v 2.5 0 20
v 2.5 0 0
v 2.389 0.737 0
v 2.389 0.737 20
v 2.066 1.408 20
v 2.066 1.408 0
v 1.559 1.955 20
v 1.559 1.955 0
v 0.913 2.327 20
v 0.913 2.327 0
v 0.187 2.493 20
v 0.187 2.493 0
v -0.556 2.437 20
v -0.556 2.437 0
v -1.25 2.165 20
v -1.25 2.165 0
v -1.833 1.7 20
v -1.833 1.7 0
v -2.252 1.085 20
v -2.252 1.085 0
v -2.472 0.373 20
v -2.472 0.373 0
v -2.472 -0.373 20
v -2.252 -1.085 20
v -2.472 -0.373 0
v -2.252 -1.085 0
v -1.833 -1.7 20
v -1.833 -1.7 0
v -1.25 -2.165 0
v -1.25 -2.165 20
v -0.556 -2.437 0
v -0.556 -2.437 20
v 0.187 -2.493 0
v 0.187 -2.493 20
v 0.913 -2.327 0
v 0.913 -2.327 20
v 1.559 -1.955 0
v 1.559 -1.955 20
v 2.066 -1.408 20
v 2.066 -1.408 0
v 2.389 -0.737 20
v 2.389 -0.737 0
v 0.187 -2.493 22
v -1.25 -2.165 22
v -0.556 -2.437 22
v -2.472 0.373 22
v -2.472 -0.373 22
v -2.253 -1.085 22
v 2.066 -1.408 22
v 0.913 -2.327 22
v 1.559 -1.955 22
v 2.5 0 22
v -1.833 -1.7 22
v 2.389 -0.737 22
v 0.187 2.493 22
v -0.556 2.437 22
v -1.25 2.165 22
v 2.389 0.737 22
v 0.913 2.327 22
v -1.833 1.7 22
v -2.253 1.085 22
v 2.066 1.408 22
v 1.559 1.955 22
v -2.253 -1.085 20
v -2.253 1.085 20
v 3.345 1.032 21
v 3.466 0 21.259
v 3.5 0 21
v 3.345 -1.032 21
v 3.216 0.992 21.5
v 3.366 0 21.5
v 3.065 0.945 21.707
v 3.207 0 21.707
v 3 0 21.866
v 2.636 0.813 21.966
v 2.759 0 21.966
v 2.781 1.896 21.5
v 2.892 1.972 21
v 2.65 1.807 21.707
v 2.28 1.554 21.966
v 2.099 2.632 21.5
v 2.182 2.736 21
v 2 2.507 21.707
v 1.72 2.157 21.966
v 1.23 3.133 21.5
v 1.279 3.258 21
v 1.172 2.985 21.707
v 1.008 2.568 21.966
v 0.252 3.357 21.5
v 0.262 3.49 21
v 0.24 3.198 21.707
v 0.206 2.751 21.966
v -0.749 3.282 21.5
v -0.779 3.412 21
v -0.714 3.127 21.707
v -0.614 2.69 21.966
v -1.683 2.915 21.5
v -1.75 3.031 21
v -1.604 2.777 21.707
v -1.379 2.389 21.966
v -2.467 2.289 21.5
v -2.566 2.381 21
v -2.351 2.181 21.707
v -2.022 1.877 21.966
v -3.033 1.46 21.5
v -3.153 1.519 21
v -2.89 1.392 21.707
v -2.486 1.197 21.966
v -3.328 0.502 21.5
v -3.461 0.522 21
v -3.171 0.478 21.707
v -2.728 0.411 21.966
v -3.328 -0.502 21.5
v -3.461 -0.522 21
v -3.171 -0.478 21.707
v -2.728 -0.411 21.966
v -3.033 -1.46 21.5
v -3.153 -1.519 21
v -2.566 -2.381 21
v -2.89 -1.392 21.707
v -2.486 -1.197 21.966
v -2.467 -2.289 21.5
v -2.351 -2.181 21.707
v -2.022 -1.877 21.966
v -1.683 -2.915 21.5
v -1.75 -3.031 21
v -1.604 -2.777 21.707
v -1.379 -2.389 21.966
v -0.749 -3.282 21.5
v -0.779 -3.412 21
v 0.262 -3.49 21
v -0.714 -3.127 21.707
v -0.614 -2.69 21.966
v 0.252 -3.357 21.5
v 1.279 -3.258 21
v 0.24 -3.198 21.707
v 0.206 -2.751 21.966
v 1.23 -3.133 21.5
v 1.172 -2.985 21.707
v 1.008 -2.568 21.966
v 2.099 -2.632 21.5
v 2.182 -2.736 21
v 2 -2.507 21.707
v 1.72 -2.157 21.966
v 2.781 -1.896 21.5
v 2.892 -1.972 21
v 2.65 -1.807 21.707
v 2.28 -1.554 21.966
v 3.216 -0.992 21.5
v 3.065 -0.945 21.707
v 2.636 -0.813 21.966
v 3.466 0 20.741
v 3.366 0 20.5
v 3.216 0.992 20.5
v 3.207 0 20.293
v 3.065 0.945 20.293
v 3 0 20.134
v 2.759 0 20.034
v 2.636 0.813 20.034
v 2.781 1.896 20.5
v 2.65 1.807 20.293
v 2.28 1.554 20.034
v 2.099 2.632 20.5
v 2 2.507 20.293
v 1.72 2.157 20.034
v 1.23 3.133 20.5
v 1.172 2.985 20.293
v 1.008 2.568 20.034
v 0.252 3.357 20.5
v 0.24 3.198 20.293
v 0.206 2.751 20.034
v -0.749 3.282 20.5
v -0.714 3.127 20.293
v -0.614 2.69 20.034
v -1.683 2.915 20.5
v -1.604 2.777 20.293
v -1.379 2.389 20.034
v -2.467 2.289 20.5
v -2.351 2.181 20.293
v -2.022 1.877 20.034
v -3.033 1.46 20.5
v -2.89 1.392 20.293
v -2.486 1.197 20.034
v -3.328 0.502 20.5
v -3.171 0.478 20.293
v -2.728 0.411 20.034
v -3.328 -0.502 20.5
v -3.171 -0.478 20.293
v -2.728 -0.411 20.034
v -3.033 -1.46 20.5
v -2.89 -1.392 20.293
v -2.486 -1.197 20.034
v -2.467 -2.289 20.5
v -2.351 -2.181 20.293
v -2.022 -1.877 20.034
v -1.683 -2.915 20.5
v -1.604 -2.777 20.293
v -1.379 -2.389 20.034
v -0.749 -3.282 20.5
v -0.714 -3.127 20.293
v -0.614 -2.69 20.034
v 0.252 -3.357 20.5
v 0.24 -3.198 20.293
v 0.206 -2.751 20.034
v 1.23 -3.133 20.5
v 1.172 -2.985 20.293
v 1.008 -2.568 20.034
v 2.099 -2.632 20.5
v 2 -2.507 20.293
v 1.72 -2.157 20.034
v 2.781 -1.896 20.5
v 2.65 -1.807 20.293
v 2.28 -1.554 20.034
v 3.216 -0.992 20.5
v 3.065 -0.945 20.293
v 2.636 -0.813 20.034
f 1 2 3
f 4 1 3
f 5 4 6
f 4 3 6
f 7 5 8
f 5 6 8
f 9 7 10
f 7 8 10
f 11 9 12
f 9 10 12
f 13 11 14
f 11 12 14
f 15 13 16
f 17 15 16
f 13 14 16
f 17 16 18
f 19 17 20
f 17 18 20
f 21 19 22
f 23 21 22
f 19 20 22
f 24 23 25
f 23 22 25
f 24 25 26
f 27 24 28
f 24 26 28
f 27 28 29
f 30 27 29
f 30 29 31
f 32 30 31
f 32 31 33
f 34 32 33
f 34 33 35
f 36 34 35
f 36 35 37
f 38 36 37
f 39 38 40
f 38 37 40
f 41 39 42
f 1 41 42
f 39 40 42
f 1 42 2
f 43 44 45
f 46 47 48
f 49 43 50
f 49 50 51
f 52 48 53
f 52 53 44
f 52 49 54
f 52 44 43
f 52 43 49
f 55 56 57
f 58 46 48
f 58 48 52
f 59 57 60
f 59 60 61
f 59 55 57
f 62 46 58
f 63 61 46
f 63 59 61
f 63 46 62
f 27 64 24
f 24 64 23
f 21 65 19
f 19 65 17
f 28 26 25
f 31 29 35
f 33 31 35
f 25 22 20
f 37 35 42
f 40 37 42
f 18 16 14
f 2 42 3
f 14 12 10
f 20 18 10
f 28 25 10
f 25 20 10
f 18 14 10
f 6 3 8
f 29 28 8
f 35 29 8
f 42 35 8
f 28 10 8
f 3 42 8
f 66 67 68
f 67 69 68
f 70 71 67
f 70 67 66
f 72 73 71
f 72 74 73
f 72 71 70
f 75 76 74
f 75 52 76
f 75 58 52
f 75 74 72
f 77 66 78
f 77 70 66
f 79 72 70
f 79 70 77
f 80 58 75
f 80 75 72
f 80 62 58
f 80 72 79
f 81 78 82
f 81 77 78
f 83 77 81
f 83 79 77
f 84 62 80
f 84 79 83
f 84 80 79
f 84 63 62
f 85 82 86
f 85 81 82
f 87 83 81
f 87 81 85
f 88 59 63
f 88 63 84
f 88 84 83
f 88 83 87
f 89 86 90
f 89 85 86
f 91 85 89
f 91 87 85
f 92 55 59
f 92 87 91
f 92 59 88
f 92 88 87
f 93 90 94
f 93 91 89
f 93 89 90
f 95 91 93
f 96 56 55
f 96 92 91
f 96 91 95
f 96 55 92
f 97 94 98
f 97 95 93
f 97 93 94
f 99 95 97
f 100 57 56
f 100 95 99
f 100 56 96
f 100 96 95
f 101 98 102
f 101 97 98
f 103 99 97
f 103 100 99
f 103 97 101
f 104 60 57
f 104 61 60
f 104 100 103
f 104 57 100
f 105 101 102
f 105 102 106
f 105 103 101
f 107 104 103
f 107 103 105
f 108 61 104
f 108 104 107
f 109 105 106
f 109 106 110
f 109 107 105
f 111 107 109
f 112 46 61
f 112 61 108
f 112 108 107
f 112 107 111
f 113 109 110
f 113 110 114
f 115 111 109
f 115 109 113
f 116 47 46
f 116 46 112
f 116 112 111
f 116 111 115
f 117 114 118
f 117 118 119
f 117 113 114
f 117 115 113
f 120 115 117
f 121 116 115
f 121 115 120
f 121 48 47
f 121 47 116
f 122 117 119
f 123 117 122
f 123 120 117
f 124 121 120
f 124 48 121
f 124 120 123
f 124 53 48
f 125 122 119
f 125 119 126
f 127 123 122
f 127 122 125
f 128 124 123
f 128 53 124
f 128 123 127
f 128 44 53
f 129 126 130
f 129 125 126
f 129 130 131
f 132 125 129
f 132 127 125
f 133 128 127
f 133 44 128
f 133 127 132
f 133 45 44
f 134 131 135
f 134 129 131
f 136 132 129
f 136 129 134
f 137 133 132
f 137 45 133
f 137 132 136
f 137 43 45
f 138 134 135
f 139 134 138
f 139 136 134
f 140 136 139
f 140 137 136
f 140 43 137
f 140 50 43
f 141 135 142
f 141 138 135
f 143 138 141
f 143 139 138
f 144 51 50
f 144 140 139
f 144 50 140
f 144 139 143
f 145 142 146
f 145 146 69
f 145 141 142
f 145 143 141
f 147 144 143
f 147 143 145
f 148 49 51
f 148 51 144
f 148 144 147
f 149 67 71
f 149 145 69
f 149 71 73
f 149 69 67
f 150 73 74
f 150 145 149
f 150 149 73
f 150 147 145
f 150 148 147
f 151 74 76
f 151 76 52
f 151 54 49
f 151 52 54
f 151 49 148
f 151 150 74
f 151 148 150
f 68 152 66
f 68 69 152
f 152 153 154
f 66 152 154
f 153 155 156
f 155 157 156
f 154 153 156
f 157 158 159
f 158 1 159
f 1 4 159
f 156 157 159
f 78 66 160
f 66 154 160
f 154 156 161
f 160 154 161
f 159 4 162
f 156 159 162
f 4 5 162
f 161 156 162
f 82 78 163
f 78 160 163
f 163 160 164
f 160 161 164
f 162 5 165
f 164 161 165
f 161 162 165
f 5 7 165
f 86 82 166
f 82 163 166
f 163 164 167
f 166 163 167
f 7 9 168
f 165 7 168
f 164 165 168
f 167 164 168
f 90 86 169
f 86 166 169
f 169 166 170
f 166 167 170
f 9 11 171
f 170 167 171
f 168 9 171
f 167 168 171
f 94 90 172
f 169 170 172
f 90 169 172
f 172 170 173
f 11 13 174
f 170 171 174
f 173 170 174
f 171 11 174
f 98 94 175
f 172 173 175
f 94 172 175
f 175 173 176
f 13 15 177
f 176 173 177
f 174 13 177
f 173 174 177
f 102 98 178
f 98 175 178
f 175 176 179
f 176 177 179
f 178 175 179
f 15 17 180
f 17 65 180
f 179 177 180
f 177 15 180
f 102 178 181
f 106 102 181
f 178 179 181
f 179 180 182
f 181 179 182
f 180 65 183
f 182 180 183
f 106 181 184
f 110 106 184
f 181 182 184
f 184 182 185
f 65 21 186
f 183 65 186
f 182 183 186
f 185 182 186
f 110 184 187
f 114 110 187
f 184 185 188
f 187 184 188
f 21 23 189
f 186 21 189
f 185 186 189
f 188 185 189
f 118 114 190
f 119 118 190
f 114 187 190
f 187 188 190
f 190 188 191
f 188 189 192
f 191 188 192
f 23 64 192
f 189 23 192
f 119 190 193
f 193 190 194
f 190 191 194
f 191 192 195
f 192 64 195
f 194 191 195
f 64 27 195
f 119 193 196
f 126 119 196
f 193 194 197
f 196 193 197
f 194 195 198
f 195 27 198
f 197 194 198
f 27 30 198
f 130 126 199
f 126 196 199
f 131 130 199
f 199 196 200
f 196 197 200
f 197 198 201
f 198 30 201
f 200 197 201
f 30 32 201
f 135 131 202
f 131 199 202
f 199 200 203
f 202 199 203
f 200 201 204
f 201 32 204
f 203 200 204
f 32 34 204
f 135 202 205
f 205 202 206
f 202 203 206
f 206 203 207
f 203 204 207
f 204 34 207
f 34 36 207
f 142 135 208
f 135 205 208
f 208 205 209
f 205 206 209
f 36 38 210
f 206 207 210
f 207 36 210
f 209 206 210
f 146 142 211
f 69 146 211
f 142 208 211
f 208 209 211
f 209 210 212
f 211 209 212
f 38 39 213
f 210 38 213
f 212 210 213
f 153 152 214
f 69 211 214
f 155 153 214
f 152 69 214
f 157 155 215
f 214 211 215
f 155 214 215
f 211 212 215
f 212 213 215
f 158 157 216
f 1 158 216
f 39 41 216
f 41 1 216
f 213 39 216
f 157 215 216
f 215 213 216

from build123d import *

# Parameters (mm, degrees)
SKETCH_1_R      = 2.5
EXTRUDE_1_DEPTH = 20
SKETCH_2_R      = 3.5
EXTRUDE_2_DEPTH = 2
FILLET_2_R      = 1


with BuildPart() as part:
    # 草图1 → 凸台-拉伸1 (new body)
    with BuildSketch(Plane.XY):
        Circle(SKETCH_1_R)
    extrude(amount=EXTRUDE_1_DEPTH)

    # 草图2 → 凸台-拉伸2 (add)
    with BuildSketch(Plane.XY.offset(20)):
        Circle(SKETCH_2_R)
    extrude(amount=EXTRUDE_2_DEPTH)

    # 圆角2
    fillet_2_edges = [part.edges().sort_by_distance(p)[0] for p in [
        (-3.5, 0, 20),
        (-3.5, 0, 22),
    ]]
    fillet(fillet_2_edges, radius=FILLET_2_R - 0.0001)  # a hair under: the kernel refuses the full size


solid = part.part
